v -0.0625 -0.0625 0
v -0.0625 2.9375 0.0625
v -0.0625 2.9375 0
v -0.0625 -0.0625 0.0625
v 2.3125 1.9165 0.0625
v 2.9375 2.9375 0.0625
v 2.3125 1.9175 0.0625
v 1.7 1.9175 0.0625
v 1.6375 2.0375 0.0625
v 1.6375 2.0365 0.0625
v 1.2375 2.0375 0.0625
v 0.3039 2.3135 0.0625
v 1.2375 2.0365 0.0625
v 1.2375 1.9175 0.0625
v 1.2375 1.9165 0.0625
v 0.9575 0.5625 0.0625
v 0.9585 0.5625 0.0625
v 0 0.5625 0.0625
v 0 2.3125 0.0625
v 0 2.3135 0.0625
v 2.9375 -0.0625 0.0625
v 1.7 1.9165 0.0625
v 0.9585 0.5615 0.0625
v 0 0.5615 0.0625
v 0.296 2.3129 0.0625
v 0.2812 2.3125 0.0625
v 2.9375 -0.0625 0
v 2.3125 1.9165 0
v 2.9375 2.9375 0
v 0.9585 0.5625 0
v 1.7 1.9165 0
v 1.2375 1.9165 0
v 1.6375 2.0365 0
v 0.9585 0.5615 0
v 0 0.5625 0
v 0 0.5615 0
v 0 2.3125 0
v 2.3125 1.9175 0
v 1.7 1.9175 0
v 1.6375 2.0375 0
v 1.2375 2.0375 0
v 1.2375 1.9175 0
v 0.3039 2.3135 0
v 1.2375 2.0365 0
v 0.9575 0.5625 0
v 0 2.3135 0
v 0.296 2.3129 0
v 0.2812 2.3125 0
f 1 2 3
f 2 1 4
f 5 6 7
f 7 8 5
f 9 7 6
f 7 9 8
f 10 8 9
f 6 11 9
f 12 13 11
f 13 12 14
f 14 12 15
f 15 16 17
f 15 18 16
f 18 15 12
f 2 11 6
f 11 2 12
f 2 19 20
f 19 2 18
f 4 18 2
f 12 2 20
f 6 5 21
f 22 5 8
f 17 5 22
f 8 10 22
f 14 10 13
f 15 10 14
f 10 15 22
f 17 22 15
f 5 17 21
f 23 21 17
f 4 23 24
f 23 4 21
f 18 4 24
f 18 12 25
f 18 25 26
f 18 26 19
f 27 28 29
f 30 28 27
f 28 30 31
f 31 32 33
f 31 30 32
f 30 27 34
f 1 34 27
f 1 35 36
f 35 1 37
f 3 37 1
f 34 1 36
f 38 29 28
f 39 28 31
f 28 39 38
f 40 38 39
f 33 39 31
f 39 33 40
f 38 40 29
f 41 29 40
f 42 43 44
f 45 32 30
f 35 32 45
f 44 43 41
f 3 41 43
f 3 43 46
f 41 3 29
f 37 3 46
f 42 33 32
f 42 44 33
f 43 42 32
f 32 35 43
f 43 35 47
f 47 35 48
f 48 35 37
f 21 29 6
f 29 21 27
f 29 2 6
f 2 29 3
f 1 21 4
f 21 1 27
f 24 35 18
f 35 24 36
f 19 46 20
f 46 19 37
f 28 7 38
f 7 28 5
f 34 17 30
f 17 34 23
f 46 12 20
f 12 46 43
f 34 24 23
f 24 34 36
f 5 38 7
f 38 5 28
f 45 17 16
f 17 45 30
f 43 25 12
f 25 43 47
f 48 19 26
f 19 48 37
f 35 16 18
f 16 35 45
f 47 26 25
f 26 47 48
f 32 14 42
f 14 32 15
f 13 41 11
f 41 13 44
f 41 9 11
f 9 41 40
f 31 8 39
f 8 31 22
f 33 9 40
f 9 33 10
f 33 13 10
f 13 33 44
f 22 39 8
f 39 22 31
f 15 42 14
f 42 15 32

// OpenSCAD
// element22.scad — left-turn double-speed belt tile (two blue arrows)
// Units: inches

straight   = false;
left_turn  = true;
right_turn = false;

plate_w = 2 + 7/8;
plate_d = 2 + 7/8;
plate_h = 1/16;
frame_w = 1/16;

belt_w    = 1.75;
belt_half = belt_w / 2;

hole_d = 3/32;
hole_r = hole_d / 2;

roller_count  = 13;
roller_h_size = 3/16;
roller_r      = roller_h_size / 2;
roller_inset  = plate_w / 20;
roller_x_lo   = 2 * roller_inset;
roller_x_hi   = plate_w - 2 * roller_inset;
roller_y_step = (plate_w - 2 * roller_inset) / 12;

b_L = plate_w / 2 - belt_half;
b_R = plate_w / 2 + belt_half;
nub = roller_x_hi - b_R;

cx         = plate_w / 2;
r_curve    = 0.48;
cx_l       = cx - r_curve;
cx_r       = cx + r_curve;
r_outer   = r_curve + belt_half;
// Belt arc threshold for roller row selection — geometric constant, not arrow-derived
y_arc_ctr = plate_d/2 + r_curve + 0.24;

arrow_w       = belt_w * 0.75;
arrow_shaft_w = arrow_w * 0.4;
arrow_head_h  = arrow_w / 2;
arrow_shaft_h = 0.25;
arrow_h       = arrow_shaft_h + arrow_head_h;
arrow_outline = 1/16;

// Upward arrow: tip at same position as element20's top arrow tip
arrow_tip_y  = 3 * plate_d / 20 + 1/4 + 7 * plate_d / 10;
arrow_up_x   = cx;
arrow_up_y   = arrow_tip_y - arrow_h;
y_merge_up   = arrow_tip_y - arrow_head_h;  // shaft/head junction = top of vertical segment

// Leftward arrow: shaft base inset from right edge by same distance as top arrow tip from top edge
// After rotate([0,0,90]) on arrow_2d, tip lands at (-arrow_h, 0) relative to translate origin
arrow_lf_y = plate_d / 2;
arrow_lf_x = plate_w - (plate_d - arrow_tip_y);
// Horizontal shaft: end where the arrowhead outer edge meets the shaft strip outer edge
h_straight = 0;

module rivet_holes() {
    spacing_x = plate_w / 10;
    spacing_y = plate_d / 10;
    inset_x   = spacing_x / 2;
    inset_y   = spacing_y / 2;
    translate([plate_w - inset_x, plate_d - inset_y, -1])
        cylinder(h = plate_h + 2, r = hole_r, $fn = 20);
    for (i = [0:9]) {
        translate([inset_x, inset_y + i * spacing_y, -1])
            cylinder(h = plate_h + 2, r = hole_r, $fn = 20);
        translate([inset_x + i * spacing_x, inset_y, -1])
            cylinder(h = plate_h + 2, r = hole_r, $fn = 20);
        if (inset_x + i * spacing_x <= roller_x_lo + roller_r - hole_r ||
            inset_x + i * spacing_x >= roller_x_hi - roller_r + hole_r) {
            translate([inset_x + i * spacing_x, plate_d - inset_y, -1])
                cylinder(h = plate_h + 2, r = hole_r, $fn = 20);
        }
    }
}

module frame() {
    color("black")
    difference() {
        translate([-frame_w, -frame_w, 0])
            cube([plate_w + 2 * frame_w, plate_d + 2 * frame_w, plate_h]);
        translate([0, 0, -0.001])
            cube([plate_w, plate_d, plate_h + 0.002]);
    }
}

module belt_cutout() {
    // Straight vertical strip (top)
    translate([(plate_w - belt_w) / 2, plate_d/2 + r_curve - 0.001, -0.001])
        cube([belt_w, plate_d/2 - r_curve + 0.002, plate_h + 0.002]);
    // Horizontal entry from right
    translate([cx_r - 0.001, plate_d/2 - belt_half - 0.001, -0.001])
        cube([plate_w - cx_r + 0.002, belt_w + 0.002, plate_h + 0.002]);
    // Arc corner fill: lower-left quadrant at (cx_r, plate_d/2 + r_curve)
    translate([cx_r, plate_d/2 + r_curve, -0.001])
    linear_extrude(plate_h + 0.002)
    intersection() {
        circle(r = r_outer, $fn = 120);
        translate([-r_outer, -r_outer]) square([r_outer, r_outer]);
    }
    // Curved corner — bottom-left of the top-right uncovered square
    translate([b_R, plate_d/2 + belt_half, -0.001])
    linear_extrude(plate_h + 0.002)
    difference() {
        square([b_L/2, b_L/2]);
        translate([b_L/2, b_L/2])
            circle(r = b_L/2, $fn = 120);
    }
}

module roller_slots() {
    // a. Horizontal bars — top-section only, right-clipped; i=12 full-width
    for (i = [0:roller_count - 1]) {
        if (roller_inset + i * roller_y_step >= y_arc_ctr - roller_y_step) {
            translate([0, 0, -0.001])
            hull() {
                translate([roller_x_lo + roller_r,
                           roller_inset + i * roller_y_step, 0])
                    cylinder(h = plate_h + 0.002, r = roller_r, $fn = 20);
                translate([(i == roller_count - 1 ? roller_x_hi : b_R) - roller_r,
                           roller_inset + i * roller_y_step, 0])
                    cylinder(h = plate_h + 0.002, r = roller_r, $fn = 20);
            }
        }
    }
    // b. Vertical entry bars — right side; skip if rx < cx_r
    for (i = [0:roller_count - 1]) {
        if (roller_inset + i * roller_y_step >= cx_r) {
            y_hi = (i == roller_count - 1) ? plate_d - roller_x_lo : plate_d/2 + belt_half;
            translate([0, 0, -0.001])
            hull() {
                translate([roller_inset + i * roller_y_step, roller_x_lo + roller_r, 0])
                    cylinder(h = plate_h + 0.002, r = roller_r, $fn = 20);
                translate([roller_inset + i * roller_y_step, y_hi - roller_r, 0])
                    cylinder(h = plate_h + 0.002, r = roller_r, $fn = 20);
            }
        }
    }
    // c. Arc radial bars — 11 bars, center (cx_r, plate_d/2 + r_curve), 180°–270°
    r_outer_bars = r_outer + nub;
    for (k = [0:10]) {
        theta = 180 + 2.25 + k * (85.5 / 10);
        translate([cx_r, plate_d/2 + r_curve, 0])
        rotate([0, 0, theta])
        translate([0, 0, -0.001])
        hull() {
            translate([r_outer_bars - roller_r, 0, 0])
                cylinder(h = plate_h + 0.002, r = roller_r, $fn = 20);
            translate([r_outer_bars - roller_r - nub, 0, 0])
                cylinder(h = plate_h + 0.002, r = roller_r, $fn = 20);
        }
    }
    // d. Diagonal corners — lower-right and upper-right of belt entry
    translate([b_R, plate_d/2 - belt_half, 0])
    rotate([0, 0, 45])
    translate([0, 0, -0.001])
    hull() {
        cylinder(h = plate_h + 0.002, r = roller_r, $fn = 20);
        translate([nub, 0, 0])
            cylinder(h = plate_h + 0.002, r = roller_r, $fn = 20);
    }
    translate([b_R, plate_d/2 + belt_half, 0])
    rotate([0, 0, 45])
    translate([0, 0, -0.001])
    hull() {
        cylinder(h = plate_h + 0.002, r = roller_r, $fn = 20);
        translate([nub, 0, 0])
            cylinder(h = plate_h + 0.002, r = roller_r, $fn = 20);
    }
}

module plate() {
    difference() {
        color("darkgray")
            cube([plate_w, plate_d, plate_h]);
        rivet_holes();
        roller_slots();
        belt_cutout();
    }
}

module rollers() {
    color("blue")
    difference() {
        union() {
            // a. Horizontal bars
            for (i = [0:roller_count - 1]) {
                if (roller_inset + i * roller_y_step >= y_arc_ctr - roller_y_step) {
                    hull() {
                        translate([roller_x_lo + roller_r,
                                   roller_inset + i * roller_y_step, 0])
                            cylinder(h = plate_h, r = roller_r, $fn = 20);
                        translate([(i == roller_count - 1 ? roller_x_hi : b_R) - roller_r,
                                   roller_inset + i * roller_y_step, 0])
                            cylinder(h = plate_h, r = roller_r, $fn = 20);
                    }
                }
            }
            // b. Vertical entry bars
            for (i = [0:roller_count - 1]) {
                if (roller_inset + i * roller_y_step >= cx_r) {
                    y_hi = (i == roller_count - 1) ? plate_d - roller_x_lo : plate_d/2 + belt_half;
                    hull() {
                        translate([roller_inset + i * roller_y_step, roller_x_lo + roller_r, 0])
                            cylinder(h = plate_h, r = roller_r, $fn = 20);
                        translate([roller_inset + i * roller_y_step, y_hi - roller_r, 0])
                            cylinder(h = plate_h, r = roller_r, $fn = 20);
                    }
                }
            }
            // c. Arc radial bars
            r_outer_bars = r_outer + nub;
            for (k = [0:10]) {
                theta = 180 + 2.25 + k * (85.5 / 10);
                translate([cx_r, plate_d/2 + r_curve, 0])
                rotate([0, 0, theta])
                hull() {
                    translate([r_outer_bars - roller_r, 0, 0])
                        cylinder(h = plate_h, r = roller_r, $fn = 20);
                    translate([r_outer_bars - roller_r - nub, 0, 0])
                        cylinder(h = plate_h, r = roller_r, $fn = 20);
                }
            }
            // d. Diagonal corners — lower-right and upper-right of belt entry
            translate([b_R, plate_d/2 - belt_half, 0])
            rotate([0, 0, 45])
            hull() {
                cylinder(h = plate_h, r = roller_r, $fn = 20);
                translate([nub, 0, 0])
                    cylinder(h = plate_h, r = roller_r, $fn = 20);
            }
            translate([b_R, plate_d/2 + belt_half, 0])
            rotate([0, 0, 45])
            hull() {
                cylinder(h = plate_h, r = roller_r, $fn = 20);
                translate([nub, 0, 0])
                    cylinder(h = plate_h, r = roller_r, $fn = 20);
            }
        }
        belt_cutout();
    }
}

module rivets() {
    spacing_x = plate_w / 10;
    spacing_y = plate_d / 10;
    inset_x   = spacing_x / 2;
    inset_y   = spacing_y / 2;
    color("lightgray") {
        translate([plate_w - inset_x, plate_d - inset_y, 0])
            cylinder(h = plate_h, r = hole_r, $fn = 20);
        for (i = [0:9]) {
            translate([inset_x, inset_y + i * spacing_y, 0])
                cylinder(h = plate_h, r = hole_r, $fn = 20);
            translate([inset_x + i * spacing_x, inset_y, 0])
                cylinder(h = plate_h, r = hole_r, $fn = 20);
            if (inset_x + i * spacing_x <= roller_x_lo + roller_r - hole_r ||
                inset_x + i * spacing_x >= roller_x_hi - roller_r + hole_r) {
                translate([inset_x + i * spacing_x, plate_d - inset_y, 0])
                    cylinder(h = plate_h, r = hole_r, $fn = 20);
            }
        }
    }
}

module arrow_2d() {
    polygon([
        [-arrow_shaft_w / 2, 0],
        [ arrow_shaft_w / 2, 0],
        [ arrow_shaft_w / 2, arrow_shaft_h],
        [ arrow_w / 2,       arrow_shaft_h],
        [ 0,                 arrow_h],
        [-arrow_w / 2,       arrow_shaft_h],
        [-arrow_shaft_w / 2, arrow_shaft_h]
    ]);
}

module arrows() {
    color("blue") {
        // Curved upward arrow (element11-style)
        union() {
            // Vertical segment: arc center up to arrowhead base
            translate([cx - arrow_shaft_w/2, plate_d/2 + r_curve, 0])
            linear_extrude(plate_h)
            difference() {
                square([arrow_shaft_w, y_merge_up - (plate_d/2 + r_curve)]);
                translate([arrow_outline, 0])
                    square([arrow_shaft_w - 2*arrow_outline, y_merge_up - (plate_d/2 + r_curve)]);
            }
            // Arc shaft: outer line 180°–265°, inner line 180°–260°
            translate([cx_r, plate_d/2 + r_curve, 0])
            linear_extrude(plate_h)
            union() {
                // Outer arc line: 180° to 265°
                intersection() {
                    difference() {
                        circle(r = r_curve + arrow_shaft_w/2, $fn = 120);
                        circle(r = r_curve + arrow_shaft_w/2 - arrow_outline, $fn = 120);
                    }
                    polygon(concat([[0,0]],
                        [for (a = [180:1:265]) [(r_curve + arrow_shaft_w/2 + 0.1) * cos(a), (r_curve + arrow_shaft_w/2 + 0.1) * sin(a)]]));
                }
                // Inner arc line: 180° to 260°
                intersection() {
                    difference() {
                        circle(r = r_curve - arrow_shaft_w/2 + arrow_outline, $fn = 120);
                        circle(r = r_curve - arrow_shaft_w/2, $fn = 120);
                    }
                    polygon(concat([[0,0]],
                        [for (a = [180:1:260]) [(r_curve - arrow_shaft_w/2 + 0.1) * cos(a), (r_curve - arrow_shaft_w/2 + 0.1) * sin(a)]]));
                }
                // Round end caps
                for (p = [
                    [-(r_curve + arrow_shaft_w/2 - arrow_outline/2), 0],
                    [-(r_curve - arrow_shaft_w/2 + arrow_outline/2), 0],
                    [(r_curve + arrow_shaft_w/2 - arrow_outline/2) * cos(265), (r_curve + arrow_shaft_w/2 - arrow_outline/2) * sin(265)],
                    [(r_curve - arrow_shaft_w/2 + arrow_outline/2) * cos(260), (r_curve - arrow_shaft_w/2 + arrow_outline/2) * sin(260)]
                ]) translate(p) circle(r = arrow_outline/2, $fn = 20);
            }
            // Horizontal segment: from arc 270° endpoint going right
            translate([cx_r, plate_d/2 - arrow_shaft_w/2, 0])
            linear_extrude(plate_h)
            difference() {
                square([h_straight, arrow_shaft_w]);
                translate([0, arrow_outline])
                    square([h_straight, arrow_shaft_w - 2*arrow_outline]);
            }
            // End cap — 90° V matching arrowhead tip angle
            translate([cx_r + h_straight, plate_d/2, 0])
            linear_extrude(plate_h)
            union() {
                hull() {
                    translate([-arrow_shaft_w / 2, 0]) circle(r = arrow_outline / 2, $fn = 20);
                    translate([-arrow_outline / sqrt(2),  arrow_shaft_w / 2 - arrow_outline / sqrt(2)]) circle(r = arrow_outline / 2, $fn = 20);
                }
                hull() {
                    translate([-arrow_shaft_w / 2, 0]) circle(r = arrow_outline / 2, $fn = 20);
                    translate([-arrow_outline / sqrt(2), -arrow_shaft_w / 2 + arrow_outline / sqrt(2)]) circle(r = arrow_outline / 2, $fn = 20);
                }
            }
            // Arrowhead — head only, base open to vertical shaft
            translate([cx, arrow_up_y, 0])
            linear_extrude(plate_h)
            intersection() {
                difference() {
                    arrow_2d();
                    offset(delta = -arrow_outline) arrow_2d();
                }
                translate([-arrow_w / 2, arrow_shaft_h])
                    square([arrow_w, arrow_head_h]);
            }
        }
        // Leftward arrow
        translate([arrow_lf_x, arrow_lf_y, 0])
        linear_extrude(plate_h)
        rotate([0, 0, 90])
        difference() {
            arrow_2d();
            offset(delta = -arrow_outline) arrow_2d();
        }
    }
}

module belt() {
    color("black")
    difference() {
        union() {
            translate([cx_r, plate_d/2 - belt_half, 0])
                cube([plate_w - cx_r, belt_w, plate_h]);
            translate([cx_r, plate_d/2 + r_curve, 0])
            linear_extrude(plate_h)
            intersection() {
                circle(r = r_outer, $fn = 120);
                translate([-r_outer, -r_outer]) square([r_outer, r_outer]);
            }
            translate([b_L, plate_d/2 + r_curve, 0])
                cube([belt_w, plate_d/2 - r_curve, plate_h]);
            translate([b_R, plate_d/2 + belt_half, 0])
            linear_extrude(plate_h)
            difference() {
                square([b_L/2, b_L/2]);
                translate([b_L/2, b_L/2])
                    circle(r = b_L/2, $fn = 120);
            }
        }
        // Curved arrow cutouts
        union() {
            // Vertical segment cutout
            translate([cx - arrow_shaft_w/2, plate_d/2 + r_curve - 0.001, -0.001])
            linear_extrude(plate_h + 0.002)
            difference() {
                square([arrow_shaft_w, y_merge_up - (plate_d/2 + r_curve) + 0.001]);
                translate([arrow_outline, 0])
                    square([arrow_shaft_w - 2*arrow_outline, y_merge_up - (plate_d/2 + r_curve)]);
            }
            // Arc shaft cutout
            translate([cx_r, plate_d/2 + r_curve, -0.001])
            linear_extrude(plate_h + 0.002)
            union() {
                // Outer arc line: 180° to 265°
                intersection() {
                    difference() {
                        circle(r = r_curve + arrow_shaft_w/2, $fn = 120);
                        circle(r = r_curve + arrow_shaft_w/2 - arrow_outline, $fn = 120);
                    }
                    polygon(concat([[0,0]],
                        [for (a = [180:1:265]) [(r_curve + arrow_shaft_w/2 + 0.1) * cos(a), (r_curve + arrow_shaft_w/2 + 0.1) * sin(a)]]));
                }
                // Inner arc line: 180° to 260°
                intersection() {
                    difference() {
                        circle(r = r_curve - arrow_shaft_w/2 + arrow_outline, $fn = 120);
                        circle(r = r_curve - arrow_shaft_w/2, $fn = 120);
                    }
                    polygon(concat([[0,0]],
                        [for (a = [180:1:260]) [(r_curve - arrow_shaft_w/2 + 0.1) * cos(a), (r_curve - arrow_shaft_w/2 + 0.1) * sin(a)]]));
                }
                // Round end caps
                for (p = [
                    [-(r_curve + arrow_shaft_w/2 - arrow_outline/2), 0],
                    [-(r_curve - arrow_shaft_w/2 + arrow_outline/2), 0],
                    [(r_curve + arrow_shaft_w/2 - arrow_outline/2) * cos(265), (r_curve + arrow_shaft_w/2 - arrow_outline/2) * sin(265)],
                    [(r_curve - arrow_shaft_w/2 + arrow_outline/2) * cos(260), (r_curve - arrow_shaft_w/2 + arrow_outline/2) * sin(260)]
                ]) translate(p) circle(r = arrow_outline/2, $fn = 20);
            }
            // Horizontal segment cutout
            translate([cx_r, plate_d/2 - arrow_shaft_w/2, -0.001])
            linear_extrude(plate_h + 0.002)
            difference() {
                square([h_straight, arrow_shaft_w]);
                translate([0, arrow_outline])
                    square([h_straight, arrow_shaft_w - 2*arrow_outline]);
            }
            // End cap cutout — 90° V matching arrowhead tip angle
            translate([cx_r + h_straight, plate_d/2, -0.001])
            linear_extrude(plate_h + 0.002)
            union() {
                hull() {
                    translate([-arrow_shaft_w / 2, 0]) circle(r = arrow_outline / 2, $fn = 20);
                    translate([-arrow_outline / sqrt(2),  arrow_shaft_w / 2 - arrow_outline / sqrt(2)]) circle(r = arrow_outline / 2, $fn = 20);
                }
                hull() {
                    translate([-arrow_shaft_w / 2, 0]) circle(r = arrow_outline / 2, $fn = 20);
                    translate([-arrow_outline / sqrt(2), -arrow_shaft_w / 2 + arrow_outline / sqrt(2)]) circle(r = arrow_outline / 2, $fn = 20);
                }
            }
            // Arrowhead cutout (head only)
            translate([cx, arrow_up_y, -0.001])
            linear_extrude(plate_h + 0.002)
            intersection() {
                difference() {
                    arrow_2d();
                    offset(delta = -arrow_outline) arrow_2d();
                }
                translate([-arrow_w / 2, arrow_shaft_h])
                    square([arrow_w, arrow_head_h]);
            }
        }
        // Cut leftward arrow outline from belt
        translate([arrow_lf_x, arrow_lf_y, -0.001])
        linear_extrude(plate_h + 0.002)
        rotate([0, 0, 90])
        difference() {
            arrow_2d();
            offset(delta = -arrow_outline) arrow_2d();
        }
    }
}

translate([plate_w, 0, 0])
mirror([1, 0, 0]) {
    frame();
    plate();
    rivets();
    rollers();
    belt();
    arrows();
}
